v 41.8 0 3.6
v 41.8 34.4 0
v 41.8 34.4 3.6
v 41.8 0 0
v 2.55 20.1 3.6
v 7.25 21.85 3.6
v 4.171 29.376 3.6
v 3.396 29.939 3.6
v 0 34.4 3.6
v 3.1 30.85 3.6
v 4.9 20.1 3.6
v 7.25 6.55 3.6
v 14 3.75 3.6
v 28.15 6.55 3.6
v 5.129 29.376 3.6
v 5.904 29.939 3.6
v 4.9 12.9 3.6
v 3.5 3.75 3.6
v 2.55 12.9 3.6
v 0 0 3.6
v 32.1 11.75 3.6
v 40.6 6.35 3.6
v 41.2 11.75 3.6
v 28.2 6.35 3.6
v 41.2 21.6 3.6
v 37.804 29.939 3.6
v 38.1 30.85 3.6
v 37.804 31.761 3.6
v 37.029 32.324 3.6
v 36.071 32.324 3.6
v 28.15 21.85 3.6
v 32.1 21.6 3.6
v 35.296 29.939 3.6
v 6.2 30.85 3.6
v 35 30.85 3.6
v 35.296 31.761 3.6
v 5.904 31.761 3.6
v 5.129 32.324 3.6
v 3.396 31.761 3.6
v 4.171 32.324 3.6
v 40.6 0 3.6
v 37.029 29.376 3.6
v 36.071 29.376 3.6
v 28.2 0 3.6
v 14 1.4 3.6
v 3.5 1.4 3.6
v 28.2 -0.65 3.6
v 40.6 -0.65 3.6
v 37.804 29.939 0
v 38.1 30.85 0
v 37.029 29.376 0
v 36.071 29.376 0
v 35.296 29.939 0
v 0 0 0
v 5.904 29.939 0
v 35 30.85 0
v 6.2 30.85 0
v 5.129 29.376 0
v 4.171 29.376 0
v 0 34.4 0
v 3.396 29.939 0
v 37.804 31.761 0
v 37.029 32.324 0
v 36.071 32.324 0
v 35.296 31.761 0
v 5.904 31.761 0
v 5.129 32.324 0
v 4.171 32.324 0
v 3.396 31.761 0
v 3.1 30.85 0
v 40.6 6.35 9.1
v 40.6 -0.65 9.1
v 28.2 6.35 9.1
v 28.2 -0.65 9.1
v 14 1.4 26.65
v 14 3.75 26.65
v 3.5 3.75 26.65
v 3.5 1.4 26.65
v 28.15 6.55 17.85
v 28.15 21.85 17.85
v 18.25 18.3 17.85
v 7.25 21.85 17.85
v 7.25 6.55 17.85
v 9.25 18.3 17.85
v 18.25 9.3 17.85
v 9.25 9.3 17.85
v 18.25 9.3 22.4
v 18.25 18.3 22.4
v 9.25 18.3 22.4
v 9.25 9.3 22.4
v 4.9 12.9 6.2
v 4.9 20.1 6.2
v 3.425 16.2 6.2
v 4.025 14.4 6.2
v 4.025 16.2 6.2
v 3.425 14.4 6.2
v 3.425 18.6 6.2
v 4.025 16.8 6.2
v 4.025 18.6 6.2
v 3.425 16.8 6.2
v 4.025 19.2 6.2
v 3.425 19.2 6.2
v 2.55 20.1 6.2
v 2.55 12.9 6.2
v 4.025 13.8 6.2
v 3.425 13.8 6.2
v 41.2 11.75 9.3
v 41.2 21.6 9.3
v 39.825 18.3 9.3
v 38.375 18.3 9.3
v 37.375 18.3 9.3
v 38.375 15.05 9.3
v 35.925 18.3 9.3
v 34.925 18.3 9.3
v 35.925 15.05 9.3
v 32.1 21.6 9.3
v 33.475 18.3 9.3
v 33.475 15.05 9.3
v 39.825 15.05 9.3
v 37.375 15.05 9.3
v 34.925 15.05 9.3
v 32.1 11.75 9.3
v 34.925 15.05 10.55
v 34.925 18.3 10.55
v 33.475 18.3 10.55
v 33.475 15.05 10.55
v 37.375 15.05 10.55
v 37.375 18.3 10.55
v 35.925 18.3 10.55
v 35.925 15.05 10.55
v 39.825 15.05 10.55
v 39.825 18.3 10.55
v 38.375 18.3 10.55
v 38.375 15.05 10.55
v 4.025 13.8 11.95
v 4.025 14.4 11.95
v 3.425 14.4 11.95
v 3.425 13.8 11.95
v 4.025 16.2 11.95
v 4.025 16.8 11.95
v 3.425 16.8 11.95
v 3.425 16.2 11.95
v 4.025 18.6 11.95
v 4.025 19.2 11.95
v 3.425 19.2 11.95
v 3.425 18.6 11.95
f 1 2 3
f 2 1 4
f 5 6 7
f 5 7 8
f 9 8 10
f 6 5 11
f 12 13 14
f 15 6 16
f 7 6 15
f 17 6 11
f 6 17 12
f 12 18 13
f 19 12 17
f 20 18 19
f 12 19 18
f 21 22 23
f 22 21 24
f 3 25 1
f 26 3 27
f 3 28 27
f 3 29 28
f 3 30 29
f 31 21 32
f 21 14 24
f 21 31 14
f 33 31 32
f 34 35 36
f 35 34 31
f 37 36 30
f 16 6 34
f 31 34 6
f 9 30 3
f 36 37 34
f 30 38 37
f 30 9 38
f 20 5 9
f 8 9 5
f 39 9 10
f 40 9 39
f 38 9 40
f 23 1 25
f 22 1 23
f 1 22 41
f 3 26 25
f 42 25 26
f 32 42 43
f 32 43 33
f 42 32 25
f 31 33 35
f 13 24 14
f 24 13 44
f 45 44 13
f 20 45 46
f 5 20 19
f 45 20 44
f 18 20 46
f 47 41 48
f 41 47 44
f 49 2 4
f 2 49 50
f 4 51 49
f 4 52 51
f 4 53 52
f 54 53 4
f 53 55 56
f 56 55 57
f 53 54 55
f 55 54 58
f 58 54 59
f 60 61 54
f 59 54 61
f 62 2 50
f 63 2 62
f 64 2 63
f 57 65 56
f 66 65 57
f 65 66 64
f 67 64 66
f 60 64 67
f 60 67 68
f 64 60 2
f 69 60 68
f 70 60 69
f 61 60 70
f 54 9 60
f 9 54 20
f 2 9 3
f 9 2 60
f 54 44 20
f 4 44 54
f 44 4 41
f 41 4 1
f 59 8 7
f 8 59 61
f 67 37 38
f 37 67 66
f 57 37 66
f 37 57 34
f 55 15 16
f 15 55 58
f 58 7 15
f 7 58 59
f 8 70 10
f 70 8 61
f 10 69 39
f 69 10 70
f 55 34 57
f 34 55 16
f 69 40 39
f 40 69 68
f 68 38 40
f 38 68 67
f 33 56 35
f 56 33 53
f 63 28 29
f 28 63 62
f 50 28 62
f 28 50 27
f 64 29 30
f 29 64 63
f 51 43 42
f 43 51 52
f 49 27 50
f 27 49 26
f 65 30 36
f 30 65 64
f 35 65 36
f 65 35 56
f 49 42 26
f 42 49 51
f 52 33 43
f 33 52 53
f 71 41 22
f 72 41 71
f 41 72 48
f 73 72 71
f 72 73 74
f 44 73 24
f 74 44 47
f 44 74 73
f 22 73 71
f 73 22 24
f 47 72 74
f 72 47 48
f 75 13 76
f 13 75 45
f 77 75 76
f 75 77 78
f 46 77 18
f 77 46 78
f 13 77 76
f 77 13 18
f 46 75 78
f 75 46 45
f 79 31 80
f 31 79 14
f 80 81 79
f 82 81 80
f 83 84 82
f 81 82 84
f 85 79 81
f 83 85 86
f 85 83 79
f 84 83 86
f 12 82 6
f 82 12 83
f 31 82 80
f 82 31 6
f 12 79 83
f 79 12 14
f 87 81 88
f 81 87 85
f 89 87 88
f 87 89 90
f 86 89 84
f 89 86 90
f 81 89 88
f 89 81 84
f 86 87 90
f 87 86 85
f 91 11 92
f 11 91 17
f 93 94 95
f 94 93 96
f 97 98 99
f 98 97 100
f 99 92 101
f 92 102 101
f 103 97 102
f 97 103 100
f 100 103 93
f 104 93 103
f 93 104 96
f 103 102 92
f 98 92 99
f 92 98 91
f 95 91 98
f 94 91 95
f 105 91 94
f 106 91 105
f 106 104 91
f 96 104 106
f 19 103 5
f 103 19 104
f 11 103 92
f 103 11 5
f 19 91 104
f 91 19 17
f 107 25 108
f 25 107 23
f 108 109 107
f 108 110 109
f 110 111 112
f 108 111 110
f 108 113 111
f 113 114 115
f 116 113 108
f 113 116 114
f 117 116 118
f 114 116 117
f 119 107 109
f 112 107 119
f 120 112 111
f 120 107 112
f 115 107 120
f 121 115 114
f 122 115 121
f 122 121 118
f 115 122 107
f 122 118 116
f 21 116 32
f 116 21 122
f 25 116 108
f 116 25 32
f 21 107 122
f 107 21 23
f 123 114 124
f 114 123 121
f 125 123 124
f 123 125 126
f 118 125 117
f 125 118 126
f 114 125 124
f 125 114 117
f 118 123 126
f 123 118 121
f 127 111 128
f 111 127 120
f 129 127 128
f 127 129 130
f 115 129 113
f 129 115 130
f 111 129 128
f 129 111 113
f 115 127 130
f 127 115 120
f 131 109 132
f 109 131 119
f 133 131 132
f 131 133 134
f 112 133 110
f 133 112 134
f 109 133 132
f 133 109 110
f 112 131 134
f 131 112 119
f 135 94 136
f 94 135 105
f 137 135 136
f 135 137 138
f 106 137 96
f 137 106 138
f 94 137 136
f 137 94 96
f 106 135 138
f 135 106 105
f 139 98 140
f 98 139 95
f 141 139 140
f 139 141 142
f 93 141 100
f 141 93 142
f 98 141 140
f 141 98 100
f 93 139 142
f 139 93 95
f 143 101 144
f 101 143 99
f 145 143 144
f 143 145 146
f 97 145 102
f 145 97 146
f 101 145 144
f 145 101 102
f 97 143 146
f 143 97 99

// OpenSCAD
module funcWcmcuStepperMotor(res=10,amais=2){
    // ----- ----- ----- Declaração de Variáveis ----- ----- ----- //
    folga1=0.125;

    pcbx=41.8;
    pcby=34.4;
    pcbz=1.6;
    pcbr=(35-28.8)/4;
    pcbalt=1.6;
    pbcentre=(35+28.8)/2;
    pcbfuro1=3.1+pcbr;
    pcbfuro2=pcby-2-pcbr;

    conectMotorx=12.4;
    conectMotory=7;
    conectMotorz=5.5;
    tMx=28.2;
    tMy=-0.65;

    conectAlix=10.5;
    conectAliy=2.35;
    conectAliz=14.15+10.5-pcbz;
    tAx=3.5;
    tAy=1.4;

    conectDRVx=20.9;
    conectDRVy=15.3;
    conectDRVz=14.25;
    tDRVx=7.25;
    tDRVy=6.55;

    conectDisspx=9;
    conectDisspy=9;
    conectDisspz=4.55;
    tDsx=2;
    tDsy=2.75;
    tDsz=conectDRVz;

    conectEDSx=2.35;
    conectEDSy=7.2;
    conectEDSz=2.6;
    tEDSx=2.55;
    tEDSy=pcby-14.3-conectEDSy;

    //conectEDSx=2.35;
    //conectEDSy=7.2;
    //conectEDSz=2.6;
    //tEDSx=2.55;
    //tEDSy=pcby-14.3-conectEDSy;

    conectStepx=9.1;
    conectStepy=9.85;
    conectStepz=5.7;
    tSx=pcbx-conectStepx-0.6;
    tSy=pcby-12.8-conectStepy;

    conectStep123x=1.45;
    conectStep123y=3.25;
    conectStep123z=1.25;
    tS1x=tSx+conectStepx/2-(3*conectStep123x+2)/2;
    tS1y=tSy+conectStepy/2-conectStep123y/2;
    tS2x=tS1x+1+conectStep123x;
    tS2y=tSy+conectStepy/2-conectStep123y/2;
    tS3x=tS2x+1+conectStep123x;
    tS3y=tSy+conectStepy/2-conectStep123y/2;

    fio06=0.6;
    fioz=5.75;

    // ----- ----- ----- MAIN ----- ----- ----- //
    difference(){
        cube([pcbx,pcby,pcbz+amais]);
        #translate([pcbfuro1,pcbfuro2,0])cylinder(pcbalt+amais,pcbr,pcbr,$fn=res);
        #translate([pcbfuro1+pbcentre,pcbfuro2,0])cylinder(pcbalt+amais,pcbr,pcbr,$fn=res);
    }

    translate([tMx,tMy,pcbz+amais])cube([conectMotorx,conectMotory,conectMotorz]);
    translate([tAx,tAy,pcbz+amais])cube([conectAlix,conectAliy,conectAliz]);
    translate([tDRVx,tDRVy,pcbz+amais])cube([conectDRVx,conectDRVy,conectDRVz]);
    translate([tDRVx+tDsx,tDRVy+tDsy,tDsz+pcbz+amais])cube([conectDisspx,conectDisspy,conectDisspz]);
    translate([tEDSx,tEDSy,pcbz+amais])cube([conectEDSx,conectEDSy,conectEDSz]);
    translate([tSx,tSy,pcbz+amais])cube([conectStepx,conectStepy,conectStepz]);
    translate([tS1x,tS1y,conectStepz+pcbz+amais])cube([conectStep123x,conectStep123y,conectStep123z]);
    translate([tS2x,tS2y,conectStepz+pcbz+amais])cube([conectStep123x,conectStep123y,conectStep123z]);
    translate([tS3x,tS3y,conectStepz+pcbz+amais])cube([conectStep123x,conectStep123y,conectStep123z]);
    translate([tEDSx+conectEDSx/2-fio06/2,tEDSy+(conectEDSy/3)/2-fio06/2,conectEDSz+pcbz+amais])cube([fio06,fio06,fioz]);
    translate([tEDSx+conectEDSx/2-fio06/2,tEDSy+(conectEDSy/3)/2-fio06/2+conectEDSy/3,conectEDSz+pcbz+amais])cube([fio06,fio06,fioz]);
    translate([tEDSx+conectEDSx/2-fio06/2,tEDSy+(conectEDSy/3)/2-fio06/2+conectEDSy/3+conectEDSy/3,conectEDSz+pcbz+amais])cube([fio06,fio06,fioz]);
}

funcWcmcuStepperMotor();
